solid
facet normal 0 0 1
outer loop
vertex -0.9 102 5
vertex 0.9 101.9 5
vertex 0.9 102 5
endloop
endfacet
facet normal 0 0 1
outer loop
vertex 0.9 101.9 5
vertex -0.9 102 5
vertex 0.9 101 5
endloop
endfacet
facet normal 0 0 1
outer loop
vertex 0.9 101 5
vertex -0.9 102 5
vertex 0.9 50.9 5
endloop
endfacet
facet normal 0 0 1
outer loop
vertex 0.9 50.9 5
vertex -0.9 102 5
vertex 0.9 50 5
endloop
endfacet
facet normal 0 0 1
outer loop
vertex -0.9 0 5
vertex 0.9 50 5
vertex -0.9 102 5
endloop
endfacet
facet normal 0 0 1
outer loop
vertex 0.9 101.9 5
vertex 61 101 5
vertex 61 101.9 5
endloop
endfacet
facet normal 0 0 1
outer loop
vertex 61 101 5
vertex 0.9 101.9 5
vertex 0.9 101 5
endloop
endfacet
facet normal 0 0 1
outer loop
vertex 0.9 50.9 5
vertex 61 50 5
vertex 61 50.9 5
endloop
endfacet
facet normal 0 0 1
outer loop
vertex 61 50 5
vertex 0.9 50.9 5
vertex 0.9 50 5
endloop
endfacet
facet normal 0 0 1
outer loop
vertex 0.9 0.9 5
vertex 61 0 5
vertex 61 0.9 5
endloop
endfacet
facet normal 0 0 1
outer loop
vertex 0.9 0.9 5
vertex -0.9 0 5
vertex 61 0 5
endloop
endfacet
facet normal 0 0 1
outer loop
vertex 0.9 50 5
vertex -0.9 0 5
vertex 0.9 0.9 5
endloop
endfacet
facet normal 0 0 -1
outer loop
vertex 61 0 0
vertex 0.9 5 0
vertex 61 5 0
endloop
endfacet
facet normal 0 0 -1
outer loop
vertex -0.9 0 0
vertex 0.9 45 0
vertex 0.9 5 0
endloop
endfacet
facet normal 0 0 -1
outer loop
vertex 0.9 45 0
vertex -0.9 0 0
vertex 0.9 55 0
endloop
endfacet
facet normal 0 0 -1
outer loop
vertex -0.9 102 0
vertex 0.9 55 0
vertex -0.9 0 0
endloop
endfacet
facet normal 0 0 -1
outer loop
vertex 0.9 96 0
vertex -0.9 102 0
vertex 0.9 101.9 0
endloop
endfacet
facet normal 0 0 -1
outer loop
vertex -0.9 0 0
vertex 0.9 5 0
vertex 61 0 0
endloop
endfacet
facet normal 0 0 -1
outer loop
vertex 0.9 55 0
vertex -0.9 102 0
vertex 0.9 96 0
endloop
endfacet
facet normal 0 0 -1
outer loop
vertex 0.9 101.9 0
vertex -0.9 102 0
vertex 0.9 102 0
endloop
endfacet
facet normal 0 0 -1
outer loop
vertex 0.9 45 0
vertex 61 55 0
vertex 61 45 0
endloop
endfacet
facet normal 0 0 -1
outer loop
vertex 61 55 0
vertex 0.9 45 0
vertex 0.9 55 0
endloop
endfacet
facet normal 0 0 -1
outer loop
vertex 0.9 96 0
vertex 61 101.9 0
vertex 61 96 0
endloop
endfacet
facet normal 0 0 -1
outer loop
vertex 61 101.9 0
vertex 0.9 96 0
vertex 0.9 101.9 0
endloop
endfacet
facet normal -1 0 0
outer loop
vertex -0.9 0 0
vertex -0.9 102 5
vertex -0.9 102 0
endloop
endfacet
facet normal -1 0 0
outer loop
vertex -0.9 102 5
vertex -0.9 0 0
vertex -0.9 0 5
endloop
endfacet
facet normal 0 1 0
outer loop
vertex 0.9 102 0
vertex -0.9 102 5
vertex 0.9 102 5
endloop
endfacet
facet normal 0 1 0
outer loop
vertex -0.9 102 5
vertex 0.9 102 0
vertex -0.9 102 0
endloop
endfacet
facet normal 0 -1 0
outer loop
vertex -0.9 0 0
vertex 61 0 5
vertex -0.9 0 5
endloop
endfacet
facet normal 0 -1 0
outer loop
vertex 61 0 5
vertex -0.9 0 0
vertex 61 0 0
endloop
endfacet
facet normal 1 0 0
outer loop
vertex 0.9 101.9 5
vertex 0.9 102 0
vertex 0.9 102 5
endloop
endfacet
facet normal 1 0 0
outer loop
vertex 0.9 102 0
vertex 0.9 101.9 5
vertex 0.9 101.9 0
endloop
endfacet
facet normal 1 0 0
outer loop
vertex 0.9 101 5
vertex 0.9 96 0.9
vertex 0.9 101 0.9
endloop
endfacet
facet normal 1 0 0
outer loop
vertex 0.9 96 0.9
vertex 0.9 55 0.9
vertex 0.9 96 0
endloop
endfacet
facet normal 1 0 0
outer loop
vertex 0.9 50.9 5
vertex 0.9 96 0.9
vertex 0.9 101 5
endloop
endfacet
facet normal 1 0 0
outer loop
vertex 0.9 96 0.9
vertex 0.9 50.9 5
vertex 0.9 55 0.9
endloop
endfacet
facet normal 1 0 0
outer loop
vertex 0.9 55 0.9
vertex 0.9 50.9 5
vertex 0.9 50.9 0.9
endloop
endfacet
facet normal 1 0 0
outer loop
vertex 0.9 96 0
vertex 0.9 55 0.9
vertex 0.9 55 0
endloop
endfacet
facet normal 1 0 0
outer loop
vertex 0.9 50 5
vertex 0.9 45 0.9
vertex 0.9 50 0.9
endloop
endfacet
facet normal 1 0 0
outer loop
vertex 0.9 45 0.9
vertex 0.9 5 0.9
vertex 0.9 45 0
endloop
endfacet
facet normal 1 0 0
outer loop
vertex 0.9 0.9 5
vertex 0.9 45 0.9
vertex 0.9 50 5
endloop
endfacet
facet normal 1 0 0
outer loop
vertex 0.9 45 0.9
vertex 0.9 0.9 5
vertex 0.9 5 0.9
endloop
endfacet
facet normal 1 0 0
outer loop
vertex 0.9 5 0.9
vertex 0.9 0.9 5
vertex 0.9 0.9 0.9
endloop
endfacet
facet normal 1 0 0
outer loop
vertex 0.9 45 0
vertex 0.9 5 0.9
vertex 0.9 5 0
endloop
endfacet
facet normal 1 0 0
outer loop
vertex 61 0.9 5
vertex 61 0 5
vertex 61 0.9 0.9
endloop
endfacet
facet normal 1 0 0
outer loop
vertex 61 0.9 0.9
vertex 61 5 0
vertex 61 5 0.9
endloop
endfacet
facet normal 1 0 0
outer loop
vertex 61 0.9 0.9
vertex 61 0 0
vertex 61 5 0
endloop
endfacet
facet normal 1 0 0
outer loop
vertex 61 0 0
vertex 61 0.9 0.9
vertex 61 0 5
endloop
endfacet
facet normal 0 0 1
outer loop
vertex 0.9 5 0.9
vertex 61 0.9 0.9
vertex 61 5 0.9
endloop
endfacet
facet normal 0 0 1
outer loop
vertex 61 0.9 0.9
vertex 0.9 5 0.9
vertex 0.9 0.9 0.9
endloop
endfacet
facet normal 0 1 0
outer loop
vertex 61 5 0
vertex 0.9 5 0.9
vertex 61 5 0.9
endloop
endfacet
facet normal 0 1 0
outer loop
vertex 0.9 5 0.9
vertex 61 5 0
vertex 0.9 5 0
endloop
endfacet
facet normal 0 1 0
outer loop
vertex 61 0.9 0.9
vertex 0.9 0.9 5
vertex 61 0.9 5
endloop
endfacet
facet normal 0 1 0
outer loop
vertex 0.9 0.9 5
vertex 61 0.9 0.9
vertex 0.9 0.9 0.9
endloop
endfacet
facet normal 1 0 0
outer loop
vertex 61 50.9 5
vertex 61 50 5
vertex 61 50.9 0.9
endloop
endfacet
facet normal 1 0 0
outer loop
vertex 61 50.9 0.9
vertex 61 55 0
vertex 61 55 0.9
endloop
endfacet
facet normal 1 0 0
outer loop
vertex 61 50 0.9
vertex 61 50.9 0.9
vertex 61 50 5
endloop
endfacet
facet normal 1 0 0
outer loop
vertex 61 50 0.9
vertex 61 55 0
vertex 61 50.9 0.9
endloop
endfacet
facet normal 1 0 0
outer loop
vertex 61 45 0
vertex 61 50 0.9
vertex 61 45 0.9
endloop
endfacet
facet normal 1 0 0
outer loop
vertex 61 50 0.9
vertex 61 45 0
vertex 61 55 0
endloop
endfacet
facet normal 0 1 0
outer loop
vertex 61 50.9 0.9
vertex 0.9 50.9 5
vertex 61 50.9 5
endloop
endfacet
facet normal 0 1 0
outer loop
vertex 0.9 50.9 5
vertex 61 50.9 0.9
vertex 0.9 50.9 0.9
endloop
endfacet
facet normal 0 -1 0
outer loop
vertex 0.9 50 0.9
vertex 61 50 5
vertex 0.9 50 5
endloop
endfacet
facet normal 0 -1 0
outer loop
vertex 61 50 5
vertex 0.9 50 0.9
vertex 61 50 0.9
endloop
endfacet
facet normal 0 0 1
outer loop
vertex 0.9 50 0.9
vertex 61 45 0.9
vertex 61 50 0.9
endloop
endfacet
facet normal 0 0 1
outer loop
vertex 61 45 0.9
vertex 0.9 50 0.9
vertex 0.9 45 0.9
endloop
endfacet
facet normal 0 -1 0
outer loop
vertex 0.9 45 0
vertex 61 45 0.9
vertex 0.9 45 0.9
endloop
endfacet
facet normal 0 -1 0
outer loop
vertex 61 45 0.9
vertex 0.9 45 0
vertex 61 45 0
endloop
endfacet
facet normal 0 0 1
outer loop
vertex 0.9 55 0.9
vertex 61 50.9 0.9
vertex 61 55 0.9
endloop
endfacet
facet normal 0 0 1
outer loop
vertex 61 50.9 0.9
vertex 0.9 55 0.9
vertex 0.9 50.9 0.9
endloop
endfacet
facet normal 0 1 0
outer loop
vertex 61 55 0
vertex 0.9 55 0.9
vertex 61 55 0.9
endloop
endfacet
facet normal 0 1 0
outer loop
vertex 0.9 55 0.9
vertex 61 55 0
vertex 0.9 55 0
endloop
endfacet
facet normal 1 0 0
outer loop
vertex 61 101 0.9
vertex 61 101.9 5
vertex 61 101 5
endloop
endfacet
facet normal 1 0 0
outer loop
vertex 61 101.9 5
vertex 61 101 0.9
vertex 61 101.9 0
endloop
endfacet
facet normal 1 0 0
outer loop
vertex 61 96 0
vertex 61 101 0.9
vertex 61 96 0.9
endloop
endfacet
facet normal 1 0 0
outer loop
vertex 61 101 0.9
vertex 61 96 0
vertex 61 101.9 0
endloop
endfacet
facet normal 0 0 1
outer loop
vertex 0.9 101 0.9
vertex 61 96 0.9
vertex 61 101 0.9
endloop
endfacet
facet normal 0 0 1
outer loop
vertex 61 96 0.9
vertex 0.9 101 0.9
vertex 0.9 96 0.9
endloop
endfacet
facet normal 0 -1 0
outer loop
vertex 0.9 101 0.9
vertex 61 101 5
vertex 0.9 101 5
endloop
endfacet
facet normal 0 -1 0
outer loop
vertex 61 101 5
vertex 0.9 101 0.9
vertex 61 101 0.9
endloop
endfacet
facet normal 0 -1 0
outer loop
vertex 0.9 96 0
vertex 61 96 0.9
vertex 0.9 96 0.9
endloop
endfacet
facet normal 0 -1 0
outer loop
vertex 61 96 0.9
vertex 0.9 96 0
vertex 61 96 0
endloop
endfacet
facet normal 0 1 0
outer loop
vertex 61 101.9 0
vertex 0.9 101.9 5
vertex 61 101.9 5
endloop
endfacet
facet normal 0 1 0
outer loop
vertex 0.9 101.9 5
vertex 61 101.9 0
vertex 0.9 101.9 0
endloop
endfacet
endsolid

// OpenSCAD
$fn=100; // resolution
frontPlateThickness=0.3;
bottomThickness=0.6;
cylRoundEdgeRadius=0.6;

face_plate_width = 61;
face_plate_height = 46.8;

compartmentWidth = 11.25;
wallThickness = 0.6;

boxDepth = 15;

bin_Z_translate = 20;
bin_Y_translate = face_plate_height + 3 + 1.5;
bin_X_translate = 0.9;

// shelf
shelf_t = 2;
shelf_w = 5;
shelf_l = 61;
shelf_d = 50;
shelf_thickness = 0.9;

opacity = 1.0;

// shelf
difference() {
union() {
//color( "red", opacity )
translate([shelf_thickness * -1,0,0])
cube([shelf_thickness, shelf_d * 2 + 2, shelf_w]);
//color( "blue", 0.5 )
cube([shelf_thickness, shelf_d * 2 + 2, shelf_w]);
}

union() {
// left
//color( "red", opacity )
cube([shelf_l, shelf_w, shelf_thickness]);
//color( "red", opacity )
cube([shelf_l, shelf_thickness, shelf_w]);
// middle
//color( "red", opacity )
translate([0,shelf_d,0])
cube([shelf_l, shelf_thickness, shelf_w]);
//color( "red", opacity )
translate([0,shelf_d - shelf_w,0])
cube([shelf_l, shelf_w, shelf_thickness]);
//color( "red", opacity )
translate([0,shelf_d,0])
cube([shelf_l, shelf_w, shelf_thickness]);
// right
//color( "red", opacity )
translate([0,shelf_d * 2 - shelf_w + 1,0])
cube([shelf_l, shelf_w, shelf_thickness]);
//color( "red", opacity )
translate([0,shelf_d * 2   + 1,0])
cube([shelf_l, shelf_thickness, shelf_w]);
}
}

union() {
// left
//color( "red", opacity )
cube([shelf_l, shelf_w, shelf_thickness]);
//color( "red", opacity )
cube([shelf_l, shelf_thickness, shelf_w]);
// middle
//color( "red", opacity )
translate([0,shelf_d,0])
cube([shelf_l, shelf_thickness, shelf_w]);
//color( "red", opacity )
translate([0,shelf_d - shelf_w,0])
cube([shelf_l, shelf_w, shelf_thickness]);
//color( "red", opacity )
translate([0,shelf_d,0])
cube([shelf_l, shelf_w, shelf_thickness]);
// right
//color( "red", opacity )
translate([0,shelf_d * 2 - shelf_w + 1,0])
cube([shelf_l, shelf_w, shelf_thickness]);
//color( "red", opacity )
translate([0,shelf_d * 2   + 1,0])
cube([shelf_l, shelf_thickness, shelf_w]);
}

// drawer
//color( "yellow", 0.2 )
//difference() {
//    minkowski() {
//        cube([face_plate_width, face_plate_height, boxDepth]);
//        translate([bin_X_translate + cylRoundEdgeRadius,bin_Y_translate +cylRoundEdgeRadius, bin_Z_translate])
//        cylinder(r=cylRoundEdgeRadius,h=bottomThickness);
//    }
//    
//    translate([bin_X_translate + cylRoundEdgeRadius,bin_Y_translate + cylRoundEdgeRadius, bin_Z_translate + 0.9])
//    cube([face_plate_width, face_plate_height, boxDepth + 1]);
//}

//color( "red", 1.0 )
//translate([bin_X_translate + cylRoundEdgeRadius,bin_Y_translate +compartmentWidth + wallThickness, bin_Z_translate])
//cube([face_plate_width, wallThickness, boxDepth]);
//
//translate([bin_X_translate + cylRoundEdgeRadius,(bin_Y_translate +compartmentWidth + wallThickness) * 2, bin_Z_translate])
//cube([face_plate_width, wallThickness, boxDepth]);
//
//translate([bin_X_translate + cylRoundEdgeRadius,(bin_Y_translate + compartmentWidth + wallThickness) * 3, bin_Z_translate])
//cube([face_plate_width, wallThickness, boxDepth]);
